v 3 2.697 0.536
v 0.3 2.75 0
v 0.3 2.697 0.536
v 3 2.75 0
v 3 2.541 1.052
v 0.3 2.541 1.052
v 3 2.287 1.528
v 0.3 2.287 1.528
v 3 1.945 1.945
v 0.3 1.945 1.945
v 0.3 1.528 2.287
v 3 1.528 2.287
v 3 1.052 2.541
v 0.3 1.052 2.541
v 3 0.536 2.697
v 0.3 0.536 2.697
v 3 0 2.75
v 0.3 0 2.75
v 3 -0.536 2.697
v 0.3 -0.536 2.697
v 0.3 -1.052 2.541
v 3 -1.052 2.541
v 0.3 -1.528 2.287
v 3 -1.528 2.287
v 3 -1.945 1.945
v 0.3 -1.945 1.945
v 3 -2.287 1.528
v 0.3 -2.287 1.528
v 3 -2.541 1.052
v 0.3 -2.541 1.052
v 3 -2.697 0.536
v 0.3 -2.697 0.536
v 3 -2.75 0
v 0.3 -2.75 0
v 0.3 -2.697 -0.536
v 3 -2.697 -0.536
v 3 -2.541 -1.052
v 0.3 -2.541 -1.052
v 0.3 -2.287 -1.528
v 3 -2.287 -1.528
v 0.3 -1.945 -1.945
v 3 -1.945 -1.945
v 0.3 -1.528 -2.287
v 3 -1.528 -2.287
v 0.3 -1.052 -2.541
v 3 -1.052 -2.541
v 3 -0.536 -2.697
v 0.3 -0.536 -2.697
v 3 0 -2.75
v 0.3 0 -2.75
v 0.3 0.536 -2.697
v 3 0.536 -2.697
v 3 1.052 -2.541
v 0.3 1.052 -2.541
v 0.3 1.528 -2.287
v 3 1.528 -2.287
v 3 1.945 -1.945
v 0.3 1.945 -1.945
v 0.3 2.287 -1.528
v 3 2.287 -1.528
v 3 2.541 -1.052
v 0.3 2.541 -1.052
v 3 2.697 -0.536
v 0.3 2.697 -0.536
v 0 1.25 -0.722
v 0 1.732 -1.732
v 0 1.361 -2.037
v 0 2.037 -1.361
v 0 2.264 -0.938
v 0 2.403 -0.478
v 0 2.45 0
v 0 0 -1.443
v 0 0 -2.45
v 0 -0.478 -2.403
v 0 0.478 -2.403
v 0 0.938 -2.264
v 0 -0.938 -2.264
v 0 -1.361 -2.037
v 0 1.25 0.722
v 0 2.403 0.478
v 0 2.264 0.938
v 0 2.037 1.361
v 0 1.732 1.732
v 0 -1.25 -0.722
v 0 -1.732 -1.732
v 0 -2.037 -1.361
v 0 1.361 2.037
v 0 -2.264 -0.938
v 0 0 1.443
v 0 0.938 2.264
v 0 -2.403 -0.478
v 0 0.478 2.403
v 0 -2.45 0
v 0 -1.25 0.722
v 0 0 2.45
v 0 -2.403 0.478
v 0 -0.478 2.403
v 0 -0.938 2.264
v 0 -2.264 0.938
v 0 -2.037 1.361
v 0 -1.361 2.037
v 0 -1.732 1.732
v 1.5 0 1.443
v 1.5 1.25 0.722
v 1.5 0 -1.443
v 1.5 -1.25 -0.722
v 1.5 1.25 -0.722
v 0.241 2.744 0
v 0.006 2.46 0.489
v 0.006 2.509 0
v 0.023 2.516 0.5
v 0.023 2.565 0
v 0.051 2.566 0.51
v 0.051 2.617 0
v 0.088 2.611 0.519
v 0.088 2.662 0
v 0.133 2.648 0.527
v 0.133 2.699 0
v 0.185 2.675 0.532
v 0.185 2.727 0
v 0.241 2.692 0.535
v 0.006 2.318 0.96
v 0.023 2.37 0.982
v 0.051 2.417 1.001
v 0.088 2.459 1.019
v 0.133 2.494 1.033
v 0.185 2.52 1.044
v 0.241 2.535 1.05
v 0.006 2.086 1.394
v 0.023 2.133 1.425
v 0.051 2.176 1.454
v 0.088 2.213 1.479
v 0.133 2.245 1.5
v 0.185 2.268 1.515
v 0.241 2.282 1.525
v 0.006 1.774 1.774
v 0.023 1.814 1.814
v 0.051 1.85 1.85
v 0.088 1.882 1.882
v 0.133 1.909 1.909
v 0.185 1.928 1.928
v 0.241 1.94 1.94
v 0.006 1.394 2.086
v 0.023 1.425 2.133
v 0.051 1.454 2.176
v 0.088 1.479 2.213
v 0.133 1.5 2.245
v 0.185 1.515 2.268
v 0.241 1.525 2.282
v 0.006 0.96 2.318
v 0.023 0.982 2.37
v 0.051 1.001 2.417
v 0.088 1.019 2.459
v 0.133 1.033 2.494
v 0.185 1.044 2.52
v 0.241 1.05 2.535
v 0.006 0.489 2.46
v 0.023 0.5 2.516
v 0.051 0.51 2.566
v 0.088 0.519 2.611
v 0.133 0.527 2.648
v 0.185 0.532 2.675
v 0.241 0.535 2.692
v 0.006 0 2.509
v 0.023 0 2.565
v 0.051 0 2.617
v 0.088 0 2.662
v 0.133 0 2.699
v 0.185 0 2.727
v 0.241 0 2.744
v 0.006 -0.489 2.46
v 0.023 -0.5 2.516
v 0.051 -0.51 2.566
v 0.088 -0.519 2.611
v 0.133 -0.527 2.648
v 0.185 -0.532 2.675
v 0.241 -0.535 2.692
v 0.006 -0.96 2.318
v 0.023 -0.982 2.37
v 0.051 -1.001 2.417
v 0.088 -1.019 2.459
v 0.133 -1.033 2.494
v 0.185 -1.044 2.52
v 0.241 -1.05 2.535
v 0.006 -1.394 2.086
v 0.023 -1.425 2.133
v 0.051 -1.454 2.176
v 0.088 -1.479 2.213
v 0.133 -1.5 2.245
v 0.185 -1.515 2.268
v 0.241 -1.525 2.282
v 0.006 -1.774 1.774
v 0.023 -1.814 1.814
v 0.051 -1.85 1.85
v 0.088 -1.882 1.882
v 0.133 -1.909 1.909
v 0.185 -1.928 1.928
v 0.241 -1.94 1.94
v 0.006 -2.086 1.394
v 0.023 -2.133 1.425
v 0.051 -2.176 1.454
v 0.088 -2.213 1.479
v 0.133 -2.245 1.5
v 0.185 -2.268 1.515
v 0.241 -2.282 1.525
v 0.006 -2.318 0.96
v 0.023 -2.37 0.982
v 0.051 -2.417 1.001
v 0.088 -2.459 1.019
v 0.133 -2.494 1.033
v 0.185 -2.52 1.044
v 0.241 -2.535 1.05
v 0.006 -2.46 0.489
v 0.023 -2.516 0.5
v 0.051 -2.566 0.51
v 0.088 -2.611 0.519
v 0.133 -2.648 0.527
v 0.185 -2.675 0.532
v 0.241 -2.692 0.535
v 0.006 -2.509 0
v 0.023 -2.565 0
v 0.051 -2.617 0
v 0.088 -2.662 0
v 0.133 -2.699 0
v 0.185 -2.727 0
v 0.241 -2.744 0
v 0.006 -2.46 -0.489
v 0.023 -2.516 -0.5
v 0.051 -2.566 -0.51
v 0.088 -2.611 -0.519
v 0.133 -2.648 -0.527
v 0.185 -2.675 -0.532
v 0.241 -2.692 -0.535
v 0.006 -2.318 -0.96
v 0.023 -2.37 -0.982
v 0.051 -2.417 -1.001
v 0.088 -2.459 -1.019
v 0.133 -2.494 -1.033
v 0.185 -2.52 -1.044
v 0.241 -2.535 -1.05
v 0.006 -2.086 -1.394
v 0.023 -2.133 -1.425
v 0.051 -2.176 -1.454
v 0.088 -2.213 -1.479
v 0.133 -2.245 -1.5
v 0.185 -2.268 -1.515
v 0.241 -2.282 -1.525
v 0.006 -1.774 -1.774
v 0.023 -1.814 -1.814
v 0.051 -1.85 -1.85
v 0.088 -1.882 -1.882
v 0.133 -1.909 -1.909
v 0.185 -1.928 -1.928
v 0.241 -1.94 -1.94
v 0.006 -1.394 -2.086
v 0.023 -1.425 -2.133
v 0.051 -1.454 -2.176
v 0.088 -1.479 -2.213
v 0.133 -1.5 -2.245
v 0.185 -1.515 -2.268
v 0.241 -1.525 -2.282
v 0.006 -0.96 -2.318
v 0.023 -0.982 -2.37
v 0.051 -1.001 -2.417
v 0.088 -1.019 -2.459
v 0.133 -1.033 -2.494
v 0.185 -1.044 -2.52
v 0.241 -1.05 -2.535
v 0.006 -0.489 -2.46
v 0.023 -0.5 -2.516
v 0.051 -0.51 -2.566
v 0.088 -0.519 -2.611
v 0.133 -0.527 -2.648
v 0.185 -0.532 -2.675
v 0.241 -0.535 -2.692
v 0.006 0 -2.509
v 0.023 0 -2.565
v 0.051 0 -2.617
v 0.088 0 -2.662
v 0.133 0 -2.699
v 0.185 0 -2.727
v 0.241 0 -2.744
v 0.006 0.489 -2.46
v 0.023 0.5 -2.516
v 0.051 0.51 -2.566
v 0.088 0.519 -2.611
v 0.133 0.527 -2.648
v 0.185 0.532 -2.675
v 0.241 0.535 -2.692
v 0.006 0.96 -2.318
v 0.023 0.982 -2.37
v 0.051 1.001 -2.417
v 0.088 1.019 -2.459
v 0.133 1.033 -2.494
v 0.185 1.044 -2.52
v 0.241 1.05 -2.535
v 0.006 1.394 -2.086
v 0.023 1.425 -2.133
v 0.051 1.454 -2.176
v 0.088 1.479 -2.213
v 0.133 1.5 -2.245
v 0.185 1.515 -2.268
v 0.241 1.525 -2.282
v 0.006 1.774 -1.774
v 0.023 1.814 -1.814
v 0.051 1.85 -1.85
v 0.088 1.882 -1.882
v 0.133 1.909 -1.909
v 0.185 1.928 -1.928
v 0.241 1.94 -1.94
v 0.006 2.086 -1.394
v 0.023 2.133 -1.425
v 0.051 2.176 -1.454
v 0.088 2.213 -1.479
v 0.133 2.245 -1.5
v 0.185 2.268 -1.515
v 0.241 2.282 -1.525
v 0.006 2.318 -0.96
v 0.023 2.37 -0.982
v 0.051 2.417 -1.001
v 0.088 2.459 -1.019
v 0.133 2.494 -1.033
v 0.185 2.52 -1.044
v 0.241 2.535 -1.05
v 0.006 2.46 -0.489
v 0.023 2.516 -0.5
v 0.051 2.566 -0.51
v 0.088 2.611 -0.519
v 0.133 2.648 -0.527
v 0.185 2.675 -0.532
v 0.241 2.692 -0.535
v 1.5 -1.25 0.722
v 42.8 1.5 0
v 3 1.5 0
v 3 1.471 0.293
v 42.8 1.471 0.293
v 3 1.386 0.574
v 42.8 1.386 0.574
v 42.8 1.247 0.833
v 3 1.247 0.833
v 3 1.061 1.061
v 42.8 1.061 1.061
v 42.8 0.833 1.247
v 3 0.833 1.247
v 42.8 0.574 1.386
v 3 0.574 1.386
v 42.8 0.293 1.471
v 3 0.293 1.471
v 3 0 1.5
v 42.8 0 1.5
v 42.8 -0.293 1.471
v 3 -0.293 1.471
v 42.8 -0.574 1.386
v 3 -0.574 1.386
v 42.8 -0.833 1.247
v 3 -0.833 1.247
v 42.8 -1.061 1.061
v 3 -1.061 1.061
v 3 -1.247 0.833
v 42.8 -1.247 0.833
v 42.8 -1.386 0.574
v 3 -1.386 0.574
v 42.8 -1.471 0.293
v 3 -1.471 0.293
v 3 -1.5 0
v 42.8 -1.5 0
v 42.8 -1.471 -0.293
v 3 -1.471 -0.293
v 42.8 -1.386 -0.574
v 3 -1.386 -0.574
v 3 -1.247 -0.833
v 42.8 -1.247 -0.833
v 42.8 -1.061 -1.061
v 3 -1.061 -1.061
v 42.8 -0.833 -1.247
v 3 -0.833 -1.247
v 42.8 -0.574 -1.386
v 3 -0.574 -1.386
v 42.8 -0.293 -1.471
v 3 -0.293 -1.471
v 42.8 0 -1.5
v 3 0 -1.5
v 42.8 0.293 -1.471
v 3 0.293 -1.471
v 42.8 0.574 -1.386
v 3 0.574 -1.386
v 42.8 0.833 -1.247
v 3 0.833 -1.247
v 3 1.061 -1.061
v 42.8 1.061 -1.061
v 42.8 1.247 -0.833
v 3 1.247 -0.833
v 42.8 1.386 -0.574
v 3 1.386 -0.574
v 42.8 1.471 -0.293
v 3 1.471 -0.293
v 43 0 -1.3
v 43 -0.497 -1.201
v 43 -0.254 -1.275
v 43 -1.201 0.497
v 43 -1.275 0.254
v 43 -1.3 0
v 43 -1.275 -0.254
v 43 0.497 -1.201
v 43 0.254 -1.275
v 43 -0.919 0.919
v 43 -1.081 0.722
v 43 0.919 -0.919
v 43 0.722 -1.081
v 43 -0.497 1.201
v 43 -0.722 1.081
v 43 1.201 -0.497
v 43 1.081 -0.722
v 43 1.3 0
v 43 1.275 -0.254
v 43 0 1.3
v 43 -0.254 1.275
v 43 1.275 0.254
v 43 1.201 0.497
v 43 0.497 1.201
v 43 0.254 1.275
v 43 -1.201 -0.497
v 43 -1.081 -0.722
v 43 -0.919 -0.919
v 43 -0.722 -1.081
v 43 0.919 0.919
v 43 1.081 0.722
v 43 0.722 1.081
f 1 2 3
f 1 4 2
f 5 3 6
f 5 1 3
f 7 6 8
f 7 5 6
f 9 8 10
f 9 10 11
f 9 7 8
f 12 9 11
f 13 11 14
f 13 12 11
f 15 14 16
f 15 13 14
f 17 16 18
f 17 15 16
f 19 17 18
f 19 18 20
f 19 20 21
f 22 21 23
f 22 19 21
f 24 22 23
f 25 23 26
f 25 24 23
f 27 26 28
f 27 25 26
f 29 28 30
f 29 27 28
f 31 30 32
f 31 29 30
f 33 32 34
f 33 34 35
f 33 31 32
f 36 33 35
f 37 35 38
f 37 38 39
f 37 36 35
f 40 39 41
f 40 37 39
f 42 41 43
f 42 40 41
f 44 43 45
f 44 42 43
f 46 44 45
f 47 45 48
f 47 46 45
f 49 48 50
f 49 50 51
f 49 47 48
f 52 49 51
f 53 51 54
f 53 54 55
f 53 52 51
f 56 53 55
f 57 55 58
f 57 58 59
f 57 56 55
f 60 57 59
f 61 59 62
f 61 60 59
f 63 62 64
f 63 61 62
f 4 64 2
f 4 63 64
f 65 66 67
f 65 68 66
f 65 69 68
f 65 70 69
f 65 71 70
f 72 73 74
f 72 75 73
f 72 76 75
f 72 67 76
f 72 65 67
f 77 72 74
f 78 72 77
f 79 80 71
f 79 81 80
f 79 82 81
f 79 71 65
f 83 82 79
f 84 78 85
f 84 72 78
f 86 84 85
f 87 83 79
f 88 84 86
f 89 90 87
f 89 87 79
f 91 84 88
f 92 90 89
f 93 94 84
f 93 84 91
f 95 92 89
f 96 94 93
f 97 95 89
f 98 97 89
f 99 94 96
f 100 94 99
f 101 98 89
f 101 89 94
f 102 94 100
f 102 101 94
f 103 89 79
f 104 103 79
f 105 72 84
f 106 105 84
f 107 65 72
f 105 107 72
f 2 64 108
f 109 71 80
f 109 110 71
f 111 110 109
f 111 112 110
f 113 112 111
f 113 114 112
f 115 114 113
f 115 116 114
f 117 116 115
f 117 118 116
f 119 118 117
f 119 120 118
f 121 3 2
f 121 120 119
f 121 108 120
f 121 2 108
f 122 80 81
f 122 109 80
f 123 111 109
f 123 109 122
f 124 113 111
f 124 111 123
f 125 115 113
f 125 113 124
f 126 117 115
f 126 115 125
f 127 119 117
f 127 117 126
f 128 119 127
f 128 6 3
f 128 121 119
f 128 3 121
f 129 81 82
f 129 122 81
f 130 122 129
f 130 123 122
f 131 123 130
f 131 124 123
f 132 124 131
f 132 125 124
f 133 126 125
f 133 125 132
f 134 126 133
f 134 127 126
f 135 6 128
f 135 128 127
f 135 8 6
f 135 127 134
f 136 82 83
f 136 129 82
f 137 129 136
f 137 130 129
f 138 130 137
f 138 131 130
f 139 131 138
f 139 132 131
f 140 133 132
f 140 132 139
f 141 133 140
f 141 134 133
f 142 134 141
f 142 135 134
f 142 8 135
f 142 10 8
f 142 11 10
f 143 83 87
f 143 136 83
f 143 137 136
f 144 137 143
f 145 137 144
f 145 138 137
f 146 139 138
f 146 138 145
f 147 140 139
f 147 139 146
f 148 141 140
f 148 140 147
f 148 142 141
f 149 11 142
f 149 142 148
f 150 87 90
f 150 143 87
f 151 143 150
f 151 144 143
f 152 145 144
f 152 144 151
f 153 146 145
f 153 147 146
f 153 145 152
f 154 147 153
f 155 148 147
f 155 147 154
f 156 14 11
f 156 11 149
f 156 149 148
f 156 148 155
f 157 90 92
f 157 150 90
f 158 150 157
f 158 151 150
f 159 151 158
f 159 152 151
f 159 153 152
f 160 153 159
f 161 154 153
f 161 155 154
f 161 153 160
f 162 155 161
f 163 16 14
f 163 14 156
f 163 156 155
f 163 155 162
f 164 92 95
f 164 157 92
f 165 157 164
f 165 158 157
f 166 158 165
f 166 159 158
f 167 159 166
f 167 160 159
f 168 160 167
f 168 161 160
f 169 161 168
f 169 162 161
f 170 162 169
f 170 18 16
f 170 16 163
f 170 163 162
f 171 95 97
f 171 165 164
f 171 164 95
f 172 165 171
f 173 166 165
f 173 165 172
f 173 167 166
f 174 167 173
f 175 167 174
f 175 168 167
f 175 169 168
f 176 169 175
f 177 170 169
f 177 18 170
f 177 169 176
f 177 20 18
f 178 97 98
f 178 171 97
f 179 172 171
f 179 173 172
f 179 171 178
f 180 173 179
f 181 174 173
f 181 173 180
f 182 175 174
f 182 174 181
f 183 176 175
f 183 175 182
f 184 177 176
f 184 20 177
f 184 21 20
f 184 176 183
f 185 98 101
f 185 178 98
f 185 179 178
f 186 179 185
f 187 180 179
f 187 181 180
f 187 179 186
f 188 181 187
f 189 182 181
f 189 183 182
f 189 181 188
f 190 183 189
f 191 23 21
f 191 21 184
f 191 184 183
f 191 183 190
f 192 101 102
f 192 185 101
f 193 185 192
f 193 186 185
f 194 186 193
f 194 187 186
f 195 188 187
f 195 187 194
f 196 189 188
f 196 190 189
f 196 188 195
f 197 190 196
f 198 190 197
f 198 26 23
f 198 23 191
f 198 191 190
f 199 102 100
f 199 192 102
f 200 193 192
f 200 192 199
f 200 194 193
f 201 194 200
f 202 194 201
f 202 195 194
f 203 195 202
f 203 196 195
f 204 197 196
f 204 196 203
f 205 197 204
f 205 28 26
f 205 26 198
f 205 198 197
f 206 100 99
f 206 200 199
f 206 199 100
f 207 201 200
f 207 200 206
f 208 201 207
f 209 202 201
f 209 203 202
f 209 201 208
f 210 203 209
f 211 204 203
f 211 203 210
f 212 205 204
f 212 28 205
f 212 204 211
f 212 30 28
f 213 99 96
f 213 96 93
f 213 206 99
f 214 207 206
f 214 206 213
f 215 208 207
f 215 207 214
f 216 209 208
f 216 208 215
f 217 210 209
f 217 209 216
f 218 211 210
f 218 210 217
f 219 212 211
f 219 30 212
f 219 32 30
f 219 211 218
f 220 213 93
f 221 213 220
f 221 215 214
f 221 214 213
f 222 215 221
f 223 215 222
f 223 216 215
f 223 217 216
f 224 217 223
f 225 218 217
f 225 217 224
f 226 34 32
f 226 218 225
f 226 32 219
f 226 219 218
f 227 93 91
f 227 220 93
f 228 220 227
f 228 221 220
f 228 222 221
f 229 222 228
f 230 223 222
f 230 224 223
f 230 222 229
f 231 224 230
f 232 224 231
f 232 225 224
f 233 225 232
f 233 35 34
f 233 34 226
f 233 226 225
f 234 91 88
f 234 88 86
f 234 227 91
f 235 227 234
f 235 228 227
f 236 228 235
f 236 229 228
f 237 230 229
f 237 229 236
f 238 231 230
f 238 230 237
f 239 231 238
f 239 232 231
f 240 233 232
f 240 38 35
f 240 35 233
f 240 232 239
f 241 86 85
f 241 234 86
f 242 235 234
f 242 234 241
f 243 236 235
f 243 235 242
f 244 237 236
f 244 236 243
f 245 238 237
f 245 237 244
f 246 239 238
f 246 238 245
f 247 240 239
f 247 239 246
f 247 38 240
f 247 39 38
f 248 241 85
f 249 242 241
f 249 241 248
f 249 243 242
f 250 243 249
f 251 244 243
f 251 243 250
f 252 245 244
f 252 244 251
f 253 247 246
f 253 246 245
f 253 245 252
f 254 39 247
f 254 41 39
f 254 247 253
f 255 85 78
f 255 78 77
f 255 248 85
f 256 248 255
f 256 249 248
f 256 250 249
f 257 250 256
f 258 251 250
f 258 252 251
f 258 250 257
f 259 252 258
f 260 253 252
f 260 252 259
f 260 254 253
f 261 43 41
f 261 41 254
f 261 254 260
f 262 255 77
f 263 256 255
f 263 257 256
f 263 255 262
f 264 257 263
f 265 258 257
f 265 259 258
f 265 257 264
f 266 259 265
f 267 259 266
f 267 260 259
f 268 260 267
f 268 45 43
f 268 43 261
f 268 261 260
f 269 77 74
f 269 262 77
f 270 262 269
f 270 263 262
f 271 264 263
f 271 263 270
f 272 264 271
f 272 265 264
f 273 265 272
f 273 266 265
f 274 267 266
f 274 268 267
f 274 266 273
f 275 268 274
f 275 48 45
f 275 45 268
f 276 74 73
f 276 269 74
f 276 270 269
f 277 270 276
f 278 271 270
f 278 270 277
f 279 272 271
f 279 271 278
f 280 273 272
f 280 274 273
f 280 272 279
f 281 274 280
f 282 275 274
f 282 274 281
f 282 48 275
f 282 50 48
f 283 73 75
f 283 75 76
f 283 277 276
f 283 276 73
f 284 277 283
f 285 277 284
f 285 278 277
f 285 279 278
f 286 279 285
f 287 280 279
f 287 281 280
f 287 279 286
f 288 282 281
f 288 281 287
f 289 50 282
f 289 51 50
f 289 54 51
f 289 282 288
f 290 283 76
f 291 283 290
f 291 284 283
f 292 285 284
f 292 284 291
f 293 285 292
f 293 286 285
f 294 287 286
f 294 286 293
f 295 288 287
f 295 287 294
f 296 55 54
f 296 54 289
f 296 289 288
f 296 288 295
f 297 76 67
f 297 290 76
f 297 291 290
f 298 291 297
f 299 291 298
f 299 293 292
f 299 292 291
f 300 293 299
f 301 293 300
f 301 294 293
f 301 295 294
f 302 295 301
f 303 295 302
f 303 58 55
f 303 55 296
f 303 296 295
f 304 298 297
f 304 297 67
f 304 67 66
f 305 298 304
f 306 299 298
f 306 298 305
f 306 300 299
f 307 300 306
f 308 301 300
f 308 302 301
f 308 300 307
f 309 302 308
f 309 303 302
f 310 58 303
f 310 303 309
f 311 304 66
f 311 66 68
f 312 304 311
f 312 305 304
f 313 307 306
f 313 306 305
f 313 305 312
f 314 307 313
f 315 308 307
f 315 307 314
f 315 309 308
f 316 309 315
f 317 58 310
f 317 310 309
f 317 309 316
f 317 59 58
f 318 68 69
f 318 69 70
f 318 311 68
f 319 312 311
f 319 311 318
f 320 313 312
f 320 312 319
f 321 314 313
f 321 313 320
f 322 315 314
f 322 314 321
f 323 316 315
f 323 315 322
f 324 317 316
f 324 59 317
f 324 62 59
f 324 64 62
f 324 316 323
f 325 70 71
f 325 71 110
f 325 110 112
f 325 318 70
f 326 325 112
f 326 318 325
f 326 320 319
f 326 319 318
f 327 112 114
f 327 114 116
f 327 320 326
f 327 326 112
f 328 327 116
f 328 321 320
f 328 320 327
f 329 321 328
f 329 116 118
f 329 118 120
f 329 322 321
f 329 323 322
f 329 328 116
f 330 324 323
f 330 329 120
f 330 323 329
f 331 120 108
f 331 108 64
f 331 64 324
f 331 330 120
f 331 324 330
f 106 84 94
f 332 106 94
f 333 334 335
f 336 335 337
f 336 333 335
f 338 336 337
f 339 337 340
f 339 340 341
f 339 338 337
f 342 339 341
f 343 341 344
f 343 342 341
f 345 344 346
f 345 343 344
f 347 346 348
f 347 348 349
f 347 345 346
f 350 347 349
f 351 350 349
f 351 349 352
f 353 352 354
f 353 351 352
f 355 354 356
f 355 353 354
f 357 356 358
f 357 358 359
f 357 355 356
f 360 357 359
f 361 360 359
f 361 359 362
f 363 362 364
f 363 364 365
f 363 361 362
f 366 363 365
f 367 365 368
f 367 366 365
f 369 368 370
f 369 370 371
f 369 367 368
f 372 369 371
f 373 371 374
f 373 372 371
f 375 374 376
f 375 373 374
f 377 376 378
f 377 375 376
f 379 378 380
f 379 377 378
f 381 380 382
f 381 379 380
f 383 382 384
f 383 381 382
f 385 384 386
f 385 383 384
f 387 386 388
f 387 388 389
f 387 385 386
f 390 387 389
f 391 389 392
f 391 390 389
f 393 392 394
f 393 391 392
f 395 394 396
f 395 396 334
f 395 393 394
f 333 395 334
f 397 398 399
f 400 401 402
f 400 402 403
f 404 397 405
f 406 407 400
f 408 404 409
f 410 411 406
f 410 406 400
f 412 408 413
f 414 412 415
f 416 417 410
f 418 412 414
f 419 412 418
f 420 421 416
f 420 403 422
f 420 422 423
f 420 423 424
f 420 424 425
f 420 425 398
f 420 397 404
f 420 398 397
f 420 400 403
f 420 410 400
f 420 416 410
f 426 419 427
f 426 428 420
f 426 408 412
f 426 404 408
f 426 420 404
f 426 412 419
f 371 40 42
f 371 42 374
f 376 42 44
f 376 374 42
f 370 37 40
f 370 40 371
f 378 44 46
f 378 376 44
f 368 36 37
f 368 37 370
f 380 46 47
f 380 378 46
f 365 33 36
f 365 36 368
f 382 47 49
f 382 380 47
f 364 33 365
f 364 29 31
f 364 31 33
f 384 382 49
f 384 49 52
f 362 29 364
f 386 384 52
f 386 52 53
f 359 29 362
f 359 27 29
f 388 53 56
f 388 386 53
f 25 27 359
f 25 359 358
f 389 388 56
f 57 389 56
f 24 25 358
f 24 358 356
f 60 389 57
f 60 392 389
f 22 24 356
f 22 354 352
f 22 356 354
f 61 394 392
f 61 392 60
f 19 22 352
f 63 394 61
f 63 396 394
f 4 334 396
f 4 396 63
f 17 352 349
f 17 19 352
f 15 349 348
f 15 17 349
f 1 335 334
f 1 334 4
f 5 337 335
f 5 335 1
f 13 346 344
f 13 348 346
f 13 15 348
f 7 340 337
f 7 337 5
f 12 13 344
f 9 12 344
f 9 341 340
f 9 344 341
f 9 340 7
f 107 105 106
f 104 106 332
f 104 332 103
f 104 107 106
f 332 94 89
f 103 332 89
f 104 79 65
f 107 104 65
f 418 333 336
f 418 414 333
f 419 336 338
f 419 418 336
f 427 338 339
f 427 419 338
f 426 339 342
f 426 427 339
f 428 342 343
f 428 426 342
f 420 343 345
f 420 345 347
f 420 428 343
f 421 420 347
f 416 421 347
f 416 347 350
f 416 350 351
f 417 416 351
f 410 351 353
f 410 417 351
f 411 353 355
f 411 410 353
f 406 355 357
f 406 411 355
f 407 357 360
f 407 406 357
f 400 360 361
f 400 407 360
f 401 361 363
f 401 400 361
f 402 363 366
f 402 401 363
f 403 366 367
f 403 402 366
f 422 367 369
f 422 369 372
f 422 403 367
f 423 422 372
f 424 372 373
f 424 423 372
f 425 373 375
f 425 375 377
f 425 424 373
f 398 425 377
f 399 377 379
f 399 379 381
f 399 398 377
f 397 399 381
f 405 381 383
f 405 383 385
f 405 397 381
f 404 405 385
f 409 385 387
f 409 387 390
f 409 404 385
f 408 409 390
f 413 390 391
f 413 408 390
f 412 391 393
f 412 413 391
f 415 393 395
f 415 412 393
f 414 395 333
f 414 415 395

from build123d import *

# Parameters (mm, degrees)
SCHNITT_LINEAR_AUSTRAGEN1_DEPTH = 1.5


with BuildPart() as part:
    # Skizze1 → Rotation1 (revolve)
    with BuildSketch(Plane.XY):
        with BuildLine():
            Line((0, 0), (0, 2.45))
            ThreePointArc((0, 2.45), (0.087867966, 2.662132034), (0.3, 2.75))
            Line((0.3, 2.75), (3, 2.75))
            Line((3, 2.75), (3, 1.5))
            Line((3, 1.5), (42.8, 1.5))
            Line((42.8, 1.5), (43, 1.3))
            Line((43, 1.3), (43, 0))
            Line((43, 0), (0, 0))
        make_face()
    revolve(axis=Axis((0, 0, 0), (1, 0, 0)))

    # Skizze2 → Schnitt-Linear austragen1 (cut)
    with BuildSketch(Plane.ZY):
        Polygon((1.443375673, 0), (0.721687836, 1.25), (-0.721687836, 1.25), (-1.443375673, 0), (-0.721687836, -1.25), (0.721687836, -1.25), align=None)
    extrude(amount=-SCHNITT_LINEAR_AUSTRAGEN1_DEPTH, mode=Mode.SUBTRACT)


solid = part.part
